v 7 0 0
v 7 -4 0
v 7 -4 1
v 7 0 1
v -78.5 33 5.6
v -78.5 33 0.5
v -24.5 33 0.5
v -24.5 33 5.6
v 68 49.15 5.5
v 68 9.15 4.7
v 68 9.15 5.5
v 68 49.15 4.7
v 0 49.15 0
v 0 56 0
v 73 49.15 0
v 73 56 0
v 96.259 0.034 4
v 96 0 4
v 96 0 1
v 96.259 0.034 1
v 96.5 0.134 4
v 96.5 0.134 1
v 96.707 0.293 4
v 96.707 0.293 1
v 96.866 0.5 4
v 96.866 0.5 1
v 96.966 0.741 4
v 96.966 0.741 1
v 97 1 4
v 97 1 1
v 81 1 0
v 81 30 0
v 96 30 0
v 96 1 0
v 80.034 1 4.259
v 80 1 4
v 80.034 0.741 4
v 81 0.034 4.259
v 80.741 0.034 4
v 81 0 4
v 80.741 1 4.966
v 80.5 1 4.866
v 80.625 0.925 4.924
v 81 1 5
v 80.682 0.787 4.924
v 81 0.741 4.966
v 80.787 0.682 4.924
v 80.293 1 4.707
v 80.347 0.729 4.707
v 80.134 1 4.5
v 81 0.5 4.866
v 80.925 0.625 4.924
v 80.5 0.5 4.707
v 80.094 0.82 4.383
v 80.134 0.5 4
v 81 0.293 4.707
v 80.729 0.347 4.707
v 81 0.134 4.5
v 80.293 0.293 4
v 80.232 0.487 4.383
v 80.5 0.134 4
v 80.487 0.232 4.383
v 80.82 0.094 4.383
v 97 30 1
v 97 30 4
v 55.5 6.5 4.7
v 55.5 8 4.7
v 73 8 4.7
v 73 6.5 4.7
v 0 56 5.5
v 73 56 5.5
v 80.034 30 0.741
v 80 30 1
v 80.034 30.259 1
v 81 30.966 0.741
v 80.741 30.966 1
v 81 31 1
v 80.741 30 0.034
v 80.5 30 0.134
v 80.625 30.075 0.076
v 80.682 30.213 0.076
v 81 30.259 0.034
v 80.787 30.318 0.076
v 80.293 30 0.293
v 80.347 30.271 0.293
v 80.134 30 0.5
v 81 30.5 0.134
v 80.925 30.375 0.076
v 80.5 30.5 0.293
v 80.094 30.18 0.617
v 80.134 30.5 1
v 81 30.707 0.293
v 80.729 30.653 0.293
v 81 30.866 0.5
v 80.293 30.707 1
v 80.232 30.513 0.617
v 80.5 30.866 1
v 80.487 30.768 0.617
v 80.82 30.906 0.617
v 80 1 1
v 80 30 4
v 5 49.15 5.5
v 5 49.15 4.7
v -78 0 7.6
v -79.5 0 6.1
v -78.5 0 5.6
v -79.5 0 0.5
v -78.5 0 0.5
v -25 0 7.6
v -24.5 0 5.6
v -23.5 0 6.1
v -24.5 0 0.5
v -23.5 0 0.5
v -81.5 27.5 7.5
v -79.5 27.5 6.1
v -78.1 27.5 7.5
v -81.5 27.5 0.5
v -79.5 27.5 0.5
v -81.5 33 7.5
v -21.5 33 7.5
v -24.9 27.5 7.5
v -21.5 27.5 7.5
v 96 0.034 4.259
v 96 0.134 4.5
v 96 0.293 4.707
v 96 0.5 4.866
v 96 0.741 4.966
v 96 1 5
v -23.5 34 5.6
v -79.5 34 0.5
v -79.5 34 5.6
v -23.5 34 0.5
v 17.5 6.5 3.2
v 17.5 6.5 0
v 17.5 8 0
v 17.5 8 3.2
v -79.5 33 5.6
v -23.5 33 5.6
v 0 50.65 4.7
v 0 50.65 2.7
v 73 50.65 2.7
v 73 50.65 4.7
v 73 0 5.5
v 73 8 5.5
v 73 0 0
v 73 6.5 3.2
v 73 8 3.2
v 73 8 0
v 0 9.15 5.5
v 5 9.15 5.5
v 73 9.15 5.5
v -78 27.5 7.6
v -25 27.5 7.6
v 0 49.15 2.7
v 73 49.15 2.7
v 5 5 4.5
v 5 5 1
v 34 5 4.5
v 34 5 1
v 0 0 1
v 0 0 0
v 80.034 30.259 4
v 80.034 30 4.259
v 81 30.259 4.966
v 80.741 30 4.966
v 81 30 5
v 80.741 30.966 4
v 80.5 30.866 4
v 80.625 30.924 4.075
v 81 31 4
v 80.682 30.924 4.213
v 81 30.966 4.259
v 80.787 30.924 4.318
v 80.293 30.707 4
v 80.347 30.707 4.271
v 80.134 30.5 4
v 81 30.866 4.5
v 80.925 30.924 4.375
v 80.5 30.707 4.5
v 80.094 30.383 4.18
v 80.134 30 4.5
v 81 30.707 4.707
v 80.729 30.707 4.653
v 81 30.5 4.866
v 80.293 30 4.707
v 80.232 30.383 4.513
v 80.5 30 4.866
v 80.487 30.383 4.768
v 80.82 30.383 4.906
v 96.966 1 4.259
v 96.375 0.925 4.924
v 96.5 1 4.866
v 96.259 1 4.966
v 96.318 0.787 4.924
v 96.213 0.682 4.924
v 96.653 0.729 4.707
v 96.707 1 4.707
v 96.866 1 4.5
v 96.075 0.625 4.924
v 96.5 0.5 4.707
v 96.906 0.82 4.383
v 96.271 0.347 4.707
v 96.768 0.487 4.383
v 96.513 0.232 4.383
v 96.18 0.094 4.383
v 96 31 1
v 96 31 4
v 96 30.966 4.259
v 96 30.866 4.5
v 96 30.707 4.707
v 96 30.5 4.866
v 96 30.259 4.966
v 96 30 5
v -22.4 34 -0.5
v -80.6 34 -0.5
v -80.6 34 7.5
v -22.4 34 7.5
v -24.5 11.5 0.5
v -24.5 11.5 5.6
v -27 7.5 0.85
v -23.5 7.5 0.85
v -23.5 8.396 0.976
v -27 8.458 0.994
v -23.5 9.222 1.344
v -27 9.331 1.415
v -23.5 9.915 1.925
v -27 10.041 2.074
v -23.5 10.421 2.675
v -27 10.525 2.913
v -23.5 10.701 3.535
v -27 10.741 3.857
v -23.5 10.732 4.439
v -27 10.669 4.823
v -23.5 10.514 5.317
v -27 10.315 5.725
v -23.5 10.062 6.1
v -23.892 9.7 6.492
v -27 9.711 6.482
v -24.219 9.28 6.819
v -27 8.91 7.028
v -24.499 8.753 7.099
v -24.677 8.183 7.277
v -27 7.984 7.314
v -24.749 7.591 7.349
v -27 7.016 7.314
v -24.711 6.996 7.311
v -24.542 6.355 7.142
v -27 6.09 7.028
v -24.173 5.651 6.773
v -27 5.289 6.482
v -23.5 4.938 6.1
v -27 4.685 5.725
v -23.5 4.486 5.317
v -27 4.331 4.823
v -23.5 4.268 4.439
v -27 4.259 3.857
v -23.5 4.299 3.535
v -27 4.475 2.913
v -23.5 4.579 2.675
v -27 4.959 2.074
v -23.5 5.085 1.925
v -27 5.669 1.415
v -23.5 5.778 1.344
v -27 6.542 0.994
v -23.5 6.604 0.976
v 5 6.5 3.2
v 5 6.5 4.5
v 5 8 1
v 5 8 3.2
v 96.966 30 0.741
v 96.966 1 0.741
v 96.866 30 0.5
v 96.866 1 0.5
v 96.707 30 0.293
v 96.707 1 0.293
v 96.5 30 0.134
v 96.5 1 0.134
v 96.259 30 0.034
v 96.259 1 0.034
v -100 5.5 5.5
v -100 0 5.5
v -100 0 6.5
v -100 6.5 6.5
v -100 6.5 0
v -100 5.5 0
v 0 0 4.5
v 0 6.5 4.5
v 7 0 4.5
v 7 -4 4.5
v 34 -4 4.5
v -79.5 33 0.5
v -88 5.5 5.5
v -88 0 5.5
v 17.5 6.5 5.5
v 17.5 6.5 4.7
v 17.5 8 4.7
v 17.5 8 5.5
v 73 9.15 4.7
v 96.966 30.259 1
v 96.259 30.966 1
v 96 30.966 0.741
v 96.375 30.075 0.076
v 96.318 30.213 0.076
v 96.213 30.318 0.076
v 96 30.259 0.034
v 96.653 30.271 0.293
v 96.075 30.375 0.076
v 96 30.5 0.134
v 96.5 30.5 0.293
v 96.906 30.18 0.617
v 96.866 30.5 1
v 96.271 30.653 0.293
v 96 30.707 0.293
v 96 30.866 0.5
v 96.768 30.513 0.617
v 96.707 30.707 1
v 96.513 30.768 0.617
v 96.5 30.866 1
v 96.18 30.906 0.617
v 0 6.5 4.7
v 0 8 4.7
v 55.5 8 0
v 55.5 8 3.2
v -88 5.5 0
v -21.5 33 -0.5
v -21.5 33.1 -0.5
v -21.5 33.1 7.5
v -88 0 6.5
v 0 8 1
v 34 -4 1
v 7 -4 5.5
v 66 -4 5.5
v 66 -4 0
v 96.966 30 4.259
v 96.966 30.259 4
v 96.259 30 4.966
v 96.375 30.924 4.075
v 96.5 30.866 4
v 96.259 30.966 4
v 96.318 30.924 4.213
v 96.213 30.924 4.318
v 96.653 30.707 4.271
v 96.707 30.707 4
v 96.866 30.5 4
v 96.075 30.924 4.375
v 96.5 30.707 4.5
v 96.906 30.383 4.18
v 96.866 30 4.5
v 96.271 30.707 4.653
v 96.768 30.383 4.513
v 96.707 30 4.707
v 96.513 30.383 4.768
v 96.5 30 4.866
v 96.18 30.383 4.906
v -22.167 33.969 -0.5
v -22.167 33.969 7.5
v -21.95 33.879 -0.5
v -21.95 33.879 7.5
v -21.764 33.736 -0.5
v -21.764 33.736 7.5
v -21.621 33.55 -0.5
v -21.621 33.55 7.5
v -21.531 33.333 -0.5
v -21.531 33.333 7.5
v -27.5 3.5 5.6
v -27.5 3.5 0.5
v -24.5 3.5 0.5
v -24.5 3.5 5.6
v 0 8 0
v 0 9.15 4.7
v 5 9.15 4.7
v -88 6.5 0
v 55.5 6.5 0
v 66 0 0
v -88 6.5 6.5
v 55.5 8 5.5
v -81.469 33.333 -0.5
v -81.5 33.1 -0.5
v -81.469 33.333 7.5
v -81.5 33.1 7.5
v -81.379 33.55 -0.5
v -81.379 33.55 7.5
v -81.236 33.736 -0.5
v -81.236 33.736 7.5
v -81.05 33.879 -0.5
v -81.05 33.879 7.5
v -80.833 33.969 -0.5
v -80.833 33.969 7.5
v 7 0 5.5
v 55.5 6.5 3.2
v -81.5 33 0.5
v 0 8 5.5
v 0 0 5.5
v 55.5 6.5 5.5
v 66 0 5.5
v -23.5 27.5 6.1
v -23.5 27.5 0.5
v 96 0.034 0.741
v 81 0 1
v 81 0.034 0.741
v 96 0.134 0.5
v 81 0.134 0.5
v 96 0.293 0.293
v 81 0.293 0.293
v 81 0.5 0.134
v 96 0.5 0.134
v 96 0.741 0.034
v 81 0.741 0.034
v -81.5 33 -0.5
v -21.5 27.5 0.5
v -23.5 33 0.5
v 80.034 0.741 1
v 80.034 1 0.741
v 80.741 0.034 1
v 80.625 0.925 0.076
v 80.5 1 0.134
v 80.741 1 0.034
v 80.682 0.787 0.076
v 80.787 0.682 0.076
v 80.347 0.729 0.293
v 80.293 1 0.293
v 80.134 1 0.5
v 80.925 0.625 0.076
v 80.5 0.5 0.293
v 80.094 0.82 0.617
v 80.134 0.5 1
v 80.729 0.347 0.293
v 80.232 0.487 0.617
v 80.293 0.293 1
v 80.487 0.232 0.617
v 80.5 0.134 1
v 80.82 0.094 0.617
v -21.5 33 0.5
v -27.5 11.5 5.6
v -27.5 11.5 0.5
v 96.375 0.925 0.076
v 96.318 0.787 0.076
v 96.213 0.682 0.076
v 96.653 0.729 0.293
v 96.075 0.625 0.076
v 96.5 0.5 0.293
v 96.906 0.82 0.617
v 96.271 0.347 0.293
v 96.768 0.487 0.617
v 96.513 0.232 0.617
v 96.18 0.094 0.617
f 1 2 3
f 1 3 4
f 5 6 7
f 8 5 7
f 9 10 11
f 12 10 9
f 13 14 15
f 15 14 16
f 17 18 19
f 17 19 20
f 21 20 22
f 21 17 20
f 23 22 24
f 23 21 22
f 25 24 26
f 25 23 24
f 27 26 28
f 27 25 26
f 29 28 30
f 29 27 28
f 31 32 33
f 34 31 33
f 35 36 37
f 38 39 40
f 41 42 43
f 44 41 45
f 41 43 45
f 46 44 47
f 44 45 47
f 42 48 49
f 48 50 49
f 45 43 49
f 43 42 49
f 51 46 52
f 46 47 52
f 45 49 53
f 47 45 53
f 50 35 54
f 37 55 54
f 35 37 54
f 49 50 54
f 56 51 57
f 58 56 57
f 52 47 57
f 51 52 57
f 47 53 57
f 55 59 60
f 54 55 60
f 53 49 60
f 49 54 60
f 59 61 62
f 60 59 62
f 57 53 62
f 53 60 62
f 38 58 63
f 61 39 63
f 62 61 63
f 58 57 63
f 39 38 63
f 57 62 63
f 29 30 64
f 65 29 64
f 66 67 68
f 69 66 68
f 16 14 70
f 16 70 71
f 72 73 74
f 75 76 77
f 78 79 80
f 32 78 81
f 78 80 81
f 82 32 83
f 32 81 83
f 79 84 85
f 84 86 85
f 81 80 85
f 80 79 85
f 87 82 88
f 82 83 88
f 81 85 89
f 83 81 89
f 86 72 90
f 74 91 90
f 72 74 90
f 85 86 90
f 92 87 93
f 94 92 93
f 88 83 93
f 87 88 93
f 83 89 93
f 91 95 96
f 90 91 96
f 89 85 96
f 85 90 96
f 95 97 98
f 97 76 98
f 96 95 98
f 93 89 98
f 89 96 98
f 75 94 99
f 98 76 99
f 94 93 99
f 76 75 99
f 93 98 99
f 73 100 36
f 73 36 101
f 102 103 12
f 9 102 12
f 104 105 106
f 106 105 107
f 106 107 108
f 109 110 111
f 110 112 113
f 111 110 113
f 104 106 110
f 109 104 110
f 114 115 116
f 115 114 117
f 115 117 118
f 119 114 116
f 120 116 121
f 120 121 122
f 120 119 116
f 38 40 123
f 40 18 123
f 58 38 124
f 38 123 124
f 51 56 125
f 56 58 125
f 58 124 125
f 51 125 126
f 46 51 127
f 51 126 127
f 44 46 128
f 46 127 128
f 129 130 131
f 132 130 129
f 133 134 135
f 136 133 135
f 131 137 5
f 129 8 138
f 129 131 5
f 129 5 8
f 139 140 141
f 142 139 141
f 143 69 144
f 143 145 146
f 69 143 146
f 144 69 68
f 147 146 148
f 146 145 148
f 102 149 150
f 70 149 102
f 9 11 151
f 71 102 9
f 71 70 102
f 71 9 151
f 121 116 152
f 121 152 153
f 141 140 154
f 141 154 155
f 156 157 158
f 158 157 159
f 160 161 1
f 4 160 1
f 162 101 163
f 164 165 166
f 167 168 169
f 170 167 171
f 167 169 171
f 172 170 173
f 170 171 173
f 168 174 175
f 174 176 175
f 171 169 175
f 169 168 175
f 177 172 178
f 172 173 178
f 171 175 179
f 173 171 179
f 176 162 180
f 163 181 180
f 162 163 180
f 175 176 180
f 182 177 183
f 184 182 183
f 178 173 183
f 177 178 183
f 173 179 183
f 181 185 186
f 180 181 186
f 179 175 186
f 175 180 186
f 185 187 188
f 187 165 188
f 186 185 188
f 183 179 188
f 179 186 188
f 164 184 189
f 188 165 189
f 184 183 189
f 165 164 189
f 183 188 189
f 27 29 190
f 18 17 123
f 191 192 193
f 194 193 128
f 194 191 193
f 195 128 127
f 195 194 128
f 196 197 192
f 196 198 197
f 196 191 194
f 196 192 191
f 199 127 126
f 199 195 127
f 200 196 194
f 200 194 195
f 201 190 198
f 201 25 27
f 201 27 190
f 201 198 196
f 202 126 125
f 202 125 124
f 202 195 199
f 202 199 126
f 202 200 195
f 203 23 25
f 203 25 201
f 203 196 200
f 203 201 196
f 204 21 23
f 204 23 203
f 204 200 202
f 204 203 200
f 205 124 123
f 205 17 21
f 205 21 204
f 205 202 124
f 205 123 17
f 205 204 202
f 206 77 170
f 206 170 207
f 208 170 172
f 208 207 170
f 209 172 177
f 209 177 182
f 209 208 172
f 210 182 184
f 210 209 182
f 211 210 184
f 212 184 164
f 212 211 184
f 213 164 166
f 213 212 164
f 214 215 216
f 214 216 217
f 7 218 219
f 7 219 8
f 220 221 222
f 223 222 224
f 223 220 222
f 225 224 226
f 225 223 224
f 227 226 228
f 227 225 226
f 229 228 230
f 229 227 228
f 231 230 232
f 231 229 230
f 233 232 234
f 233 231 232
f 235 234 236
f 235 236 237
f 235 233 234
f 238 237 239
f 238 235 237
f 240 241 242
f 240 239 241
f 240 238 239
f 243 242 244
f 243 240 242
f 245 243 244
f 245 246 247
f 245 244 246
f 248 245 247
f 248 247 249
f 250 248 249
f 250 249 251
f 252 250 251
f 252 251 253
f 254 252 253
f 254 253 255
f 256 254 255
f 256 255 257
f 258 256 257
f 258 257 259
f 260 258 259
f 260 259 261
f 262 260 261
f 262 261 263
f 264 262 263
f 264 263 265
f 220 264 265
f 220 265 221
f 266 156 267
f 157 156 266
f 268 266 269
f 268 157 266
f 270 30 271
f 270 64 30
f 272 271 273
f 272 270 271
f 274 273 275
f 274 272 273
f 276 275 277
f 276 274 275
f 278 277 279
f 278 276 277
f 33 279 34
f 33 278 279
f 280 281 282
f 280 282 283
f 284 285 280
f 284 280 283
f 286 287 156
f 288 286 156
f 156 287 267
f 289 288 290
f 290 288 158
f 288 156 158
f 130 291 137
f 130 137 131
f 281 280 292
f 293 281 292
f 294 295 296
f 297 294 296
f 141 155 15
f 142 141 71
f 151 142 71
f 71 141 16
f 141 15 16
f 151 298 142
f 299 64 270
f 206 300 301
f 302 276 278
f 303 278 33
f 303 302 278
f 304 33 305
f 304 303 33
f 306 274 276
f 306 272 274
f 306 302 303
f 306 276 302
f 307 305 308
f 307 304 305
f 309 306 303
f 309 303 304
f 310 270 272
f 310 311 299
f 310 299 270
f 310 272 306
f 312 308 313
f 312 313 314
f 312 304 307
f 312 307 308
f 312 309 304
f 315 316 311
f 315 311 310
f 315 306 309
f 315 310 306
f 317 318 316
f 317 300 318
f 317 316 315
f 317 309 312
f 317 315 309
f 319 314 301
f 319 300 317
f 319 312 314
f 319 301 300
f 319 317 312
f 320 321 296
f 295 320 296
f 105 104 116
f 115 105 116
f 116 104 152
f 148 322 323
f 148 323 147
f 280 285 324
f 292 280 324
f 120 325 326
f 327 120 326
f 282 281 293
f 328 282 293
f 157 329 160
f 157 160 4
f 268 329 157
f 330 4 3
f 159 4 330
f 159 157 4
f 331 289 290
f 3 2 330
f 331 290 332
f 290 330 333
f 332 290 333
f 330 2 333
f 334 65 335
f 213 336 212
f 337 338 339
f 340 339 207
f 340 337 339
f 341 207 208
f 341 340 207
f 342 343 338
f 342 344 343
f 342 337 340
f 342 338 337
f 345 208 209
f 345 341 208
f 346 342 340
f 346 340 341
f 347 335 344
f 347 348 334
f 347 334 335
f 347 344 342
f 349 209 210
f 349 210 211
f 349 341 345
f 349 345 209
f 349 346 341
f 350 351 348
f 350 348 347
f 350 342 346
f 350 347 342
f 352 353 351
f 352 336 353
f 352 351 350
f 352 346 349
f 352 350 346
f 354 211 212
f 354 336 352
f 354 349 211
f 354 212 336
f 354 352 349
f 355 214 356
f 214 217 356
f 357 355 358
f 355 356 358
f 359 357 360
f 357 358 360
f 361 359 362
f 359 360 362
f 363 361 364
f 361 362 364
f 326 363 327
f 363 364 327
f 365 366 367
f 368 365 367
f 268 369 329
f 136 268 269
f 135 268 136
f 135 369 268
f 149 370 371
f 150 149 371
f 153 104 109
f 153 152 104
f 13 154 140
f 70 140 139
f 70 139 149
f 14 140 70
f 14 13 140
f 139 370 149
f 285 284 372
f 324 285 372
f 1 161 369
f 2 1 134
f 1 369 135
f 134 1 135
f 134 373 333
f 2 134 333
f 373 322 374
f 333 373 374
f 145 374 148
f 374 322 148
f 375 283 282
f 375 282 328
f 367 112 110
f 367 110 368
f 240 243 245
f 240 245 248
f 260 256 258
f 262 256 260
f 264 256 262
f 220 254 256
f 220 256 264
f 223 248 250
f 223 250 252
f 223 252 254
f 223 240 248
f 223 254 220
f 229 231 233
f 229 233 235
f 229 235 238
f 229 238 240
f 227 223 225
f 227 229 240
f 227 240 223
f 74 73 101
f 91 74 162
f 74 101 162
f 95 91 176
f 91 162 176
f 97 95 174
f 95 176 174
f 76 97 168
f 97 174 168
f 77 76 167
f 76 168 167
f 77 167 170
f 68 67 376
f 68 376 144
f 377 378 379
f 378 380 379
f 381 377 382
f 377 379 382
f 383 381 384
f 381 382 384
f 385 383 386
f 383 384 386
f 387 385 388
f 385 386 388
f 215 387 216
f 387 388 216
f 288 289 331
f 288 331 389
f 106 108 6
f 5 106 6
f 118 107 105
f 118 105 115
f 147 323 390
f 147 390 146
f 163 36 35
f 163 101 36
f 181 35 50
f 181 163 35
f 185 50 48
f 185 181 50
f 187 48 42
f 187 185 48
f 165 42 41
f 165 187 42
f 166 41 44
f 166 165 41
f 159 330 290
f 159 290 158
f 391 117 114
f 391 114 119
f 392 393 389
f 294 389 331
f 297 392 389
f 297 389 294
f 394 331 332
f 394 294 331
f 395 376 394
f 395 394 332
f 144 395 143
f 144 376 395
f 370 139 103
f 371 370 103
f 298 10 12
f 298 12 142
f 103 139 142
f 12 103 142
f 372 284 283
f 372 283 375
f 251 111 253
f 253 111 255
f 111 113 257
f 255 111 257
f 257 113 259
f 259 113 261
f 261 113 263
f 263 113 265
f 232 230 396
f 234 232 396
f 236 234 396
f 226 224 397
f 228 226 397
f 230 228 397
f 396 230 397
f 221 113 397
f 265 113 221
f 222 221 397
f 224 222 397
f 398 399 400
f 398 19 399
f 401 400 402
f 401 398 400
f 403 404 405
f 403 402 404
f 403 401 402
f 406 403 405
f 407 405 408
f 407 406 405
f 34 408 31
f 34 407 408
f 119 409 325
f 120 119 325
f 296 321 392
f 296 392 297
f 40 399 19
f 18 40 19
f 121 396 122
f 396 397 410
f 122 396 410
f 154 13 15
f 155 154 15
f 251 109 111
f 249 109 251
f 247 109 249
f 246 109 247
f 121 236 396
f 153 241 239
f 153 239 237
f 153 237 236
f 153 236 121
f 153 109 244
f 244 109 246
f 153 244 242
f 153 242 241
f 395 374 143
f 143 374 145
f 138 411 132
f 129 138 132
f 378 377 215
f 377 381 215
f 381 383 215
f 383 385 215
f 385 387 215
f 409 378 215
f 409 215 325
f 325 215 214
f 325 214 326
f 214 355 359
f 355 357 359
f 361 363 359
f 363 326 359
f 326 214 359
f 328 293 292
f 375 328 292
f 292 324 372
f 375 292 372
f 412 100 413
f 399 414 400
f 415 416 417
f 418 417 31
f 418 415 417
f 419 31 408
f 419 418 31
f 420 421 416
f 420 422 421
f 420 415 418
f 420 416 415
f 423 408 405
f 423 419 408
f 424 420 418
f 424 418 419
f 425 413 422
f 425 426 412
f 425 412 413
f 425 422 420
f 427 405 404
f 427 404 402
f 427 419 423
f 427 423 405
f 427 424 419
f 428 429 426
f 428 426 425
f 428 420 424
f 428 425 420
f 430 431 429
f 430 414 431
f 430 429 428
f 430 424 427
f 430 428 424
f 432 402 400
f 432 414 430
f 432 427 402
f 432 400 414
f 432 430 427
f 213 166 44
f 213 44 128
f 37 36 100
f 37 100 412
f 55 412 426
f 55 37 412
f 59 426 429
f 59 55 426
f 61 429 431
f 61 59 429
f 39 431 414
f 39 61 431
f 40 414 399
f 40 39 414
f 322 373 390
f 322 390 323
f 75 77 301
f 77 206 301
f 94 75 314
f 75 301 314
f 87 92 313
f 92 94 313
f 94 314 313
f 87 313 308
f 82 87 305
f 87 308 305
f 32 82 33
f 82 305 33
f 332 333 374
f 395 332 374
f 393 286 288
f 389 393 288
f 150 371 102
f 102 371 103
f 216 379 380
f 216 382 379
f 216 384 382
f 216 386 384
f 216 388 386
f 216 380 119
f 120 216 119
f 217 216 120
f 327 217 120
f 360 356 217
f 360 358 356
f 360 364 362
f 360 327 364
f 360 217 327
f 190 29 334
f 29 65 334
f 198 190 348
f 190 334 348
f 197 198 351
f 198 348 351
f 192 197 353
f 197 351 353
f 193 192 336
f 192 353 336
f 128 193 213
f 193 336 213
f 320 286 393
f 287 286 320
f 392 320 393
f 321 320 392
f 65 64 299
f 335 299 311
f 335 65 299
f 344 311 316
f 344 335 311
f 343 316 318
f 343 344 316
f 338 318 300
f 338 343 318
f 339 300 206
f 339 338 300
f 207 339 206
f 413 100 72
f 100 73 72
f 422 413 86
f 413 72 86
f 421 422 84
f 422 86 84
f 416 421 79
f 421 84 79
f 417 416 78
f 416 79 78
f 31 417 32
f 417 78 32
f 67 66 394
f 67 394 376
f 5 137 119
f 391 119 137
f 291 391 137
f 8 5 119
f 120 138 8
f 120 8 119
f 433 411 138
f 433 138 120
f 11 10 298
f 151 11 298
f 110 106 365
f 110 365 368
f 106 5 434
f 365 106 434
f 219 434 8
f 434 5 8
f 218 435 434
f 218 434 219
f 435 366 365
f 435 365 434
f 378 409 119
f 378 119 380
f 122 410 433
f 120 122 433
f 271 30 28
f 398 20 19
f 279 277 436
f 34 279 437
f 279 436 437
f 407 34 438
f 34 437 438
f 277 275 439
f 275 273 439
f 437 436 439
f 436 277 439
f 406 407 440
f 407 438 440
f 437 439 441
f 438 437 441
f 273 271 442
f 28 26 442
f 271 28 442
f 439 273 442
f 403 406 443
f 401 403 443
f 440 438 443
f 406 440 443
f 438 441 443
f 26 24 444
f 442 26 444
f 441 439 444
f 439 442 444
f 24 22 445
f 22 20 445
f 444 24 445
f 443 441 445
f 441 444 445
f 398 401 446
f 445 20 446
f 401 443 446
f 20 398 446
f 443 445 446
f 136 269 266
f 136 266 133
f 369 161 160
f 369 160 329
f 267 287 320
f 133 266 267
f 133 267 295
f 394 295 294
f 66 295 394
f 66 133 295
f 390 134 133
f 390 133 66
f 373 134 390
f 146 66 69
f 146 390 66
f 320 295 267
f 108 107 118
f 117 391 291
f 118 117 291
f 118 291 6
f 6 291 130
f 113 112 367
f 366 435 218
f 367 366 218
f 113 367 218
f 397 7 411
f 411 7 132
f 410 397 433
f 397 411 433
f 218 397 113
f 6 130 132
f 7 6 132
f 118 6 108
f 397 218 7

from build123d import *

# Parameters (mm, degrees)
BOX012_W          = 5
BOX012_H          = 41.5
BOX012_DEPTH      = 0.8
BOX013_W          = 5
BOX013_H          = 41.5
BOX013_DEPTH      = 0.8
BOX008_W          = 73
BOX008_H          = 1.5
BOX008_DEPTH      = 2
BOX007_W          = 73
BOX007_H          = 1.5
BOX007_DEPTH      = 5.5
BOX005_W          = 73
BOX005_H          = 5.35
BOX005_DEPTH      = 5.5
BOX015_W          = 34
BOX015_H          = 5
BOX015_DEPTH      = 3.5
BOX016_W          = 27
BOX016_H          = 4
BOX016_DEPTH      = 3.5
BOX014_W          = 5
BOX014_H          = 8
BOX014_DEPTH      = 3.5
BOX010_W          = 73
BOX010_H          = 1.5
BOX010_DEPTH      = 1.5
BOX011_W          = 38
BOX011_H          = 1.5
BOX011_DEPTH      = 5.5
BOX001_W          = 73
BOX001_H          = 6.5
BOX001_DEPTH      = 5.5
BOX009_W          = 73
BOX009_H          = 1.5
BOX009_DEPTH      = 5.5
BOX002_W          = 59
BOX002_H          = 4
BOX002_DEPTH      = 5.5
BOX044_W          = 17
BOX044_H          = 31
BOX044_DEPTH      = 5
FILLET007_R       = 1
BOX046_W          = 12
BOX046_H          = 5.5
BOX046_DEPTH      = 5.5
BOX045_W          = 12
BOX045_H          = 6.5
BOX045_DEPTH      = 6.5
CYLINDER005_R     = 3.25
CYLINDER005_DEPTH = 3.5
BOX043_W          = 3
BOX043_H          = 8
BOX043_DEPTH      = 5.5
BOX017_W          = 54
BOX017_H          = 33
BOX017_DEPTH      = 5.1
BOX026_W          = 60
BOX026_H          = 5.5
BOX026_DEPTH      = 7
BOX_W             = 56
BOX_H             = 34
BOX_DEPTH         = 5.1
BOX025_W          = 56
BOX025_H          = 27.5
BOX025_DEPTH      = 2
CHAMFER_SIZE      = 1.5
BOX047_W          = 60
BOX047_H          = 1
BOX047_DEPTH      = 8
FILLET_R          = 0.9
FILLET008_R       = 0.9


with BuildPart() as cube_front_cover_left:
    # Box012 → Box012 (new body)
    with BuildSketch(Plane(origin=(0, 9.15, 4.7), x_dir=(1, 0, 0), z_dir=(0, 0, 1))):
        with Locations((2.5, 20.75)):
            Rectangle(BOX012_W, BOX012_H)
    extrude(amount=BOX012_DEPTH)


with BuildPart() as cube_front_cover_right:
    # Box013 → Box013 (new body)
    with BuildSketch(Plane(origin=(68, 9.15, 4.7), x_dir=(1, 0, 0), z_dir=(0, 0, 1))):
        with Locations((2.5, 20.75)):
            Rectangle(BOX013_W, BOX013_H)
    extrude(amount=BOX013_DEPTH)


with BuildPart() as cube_screen_surround_top_groove_inner:
    # Box008 → Box008 (new body)
    with BuildSketch(Plane(origin=(0, 49.15, 2.7), x_dir=(1, 0, 0), z_dir=(0, 0, 1))):
        with Locations((36.5, 0.75)):
            Rectangle(BOX008_W, BOX008_H)
    extrude(amount=BOX008_DEPTH)


with BuildPart() as cube_screen_surround_top_groove_outer:
    # Box007 → Box007 (new body)
    with BuildSketch(Plane(origin=(0, 49.15, 0), x_dir=(1, 0, 0), z_dir=(0, 0, 1))):
        with Locations((36.5, 0.75)):
            Rectangle(BOX007_W, BOX007_H)
    extrude(amount=BOX007_DEPTH)


with BuildPart() as fusion002:
    # Box005 → Box005 (new body)
    with BuildSketch(Plane(origin=(0, 50.65, 0), x_dir=(1, 0, 0), z_dir=(0, 0, 1))):
        with Locations((36.5, 2.675)):
            Rectangle(BOX005_W, BOX005_H)
    extrude(amount=BOX005_DEPTH)

    # Fusion001: union Cube(screen_surround_top_groove_outer)
    add(cube_screen_surround_top_groove_outer.part)

    # Cut002: cut Cube(screen_surround_top_groove_inner)
    add(cube_screen_surround_top_groove_inner.part, mode=Mode.SUBTRACT)

    # Fusion002: union Cube(front_cover_left), Cube(front_cover_right)
    add(cube_front_cover_left.part)
    add(cube_front_cover_right.part)


with BuildPart() as cube001_wire_cutter_left_bottom:
    # Box015 → Box015 (new body)
    with BuildSketch(Plane.XY.offset(1)):
        with Locations((17, 2.5)):
            Rectangle(BOX015_W, BOX015_H)
    extrude(amount=BOX015_DEPTH)


with BuildPart() as cube002_wire_cutter_bottom:
    # Box016 → Box016 (new body)
    with BuildSketch(Plane(origin=(7, -4, 1), x_dir=(1, 0, 0), z_dir=(0, 0, 1))):
        with Locations((13.5, 2)):
            Rectangle(BOX016_W, BOX016_H)
    extrude(amount=BOX016_DEPTH)


with BuildPart() as cube_wire_cutter_left:
    # Box014 → Box014 (new body)
    with BuildSketch(Plane.XY.offset(1)):
        with Locations((2.5, 4)):
            Rectangle(BOX014_W, BOX014_H)
    extrude(amount=BOX014_DEPTH)


with BuildPart() as cube_screen_surround_bottom_groove_inner:
    # Box010 → Box010 (new body)
    with BuildSketch(Plane(origin=(0, 6.5, 3.2), x_dir=(1, 0, 0), z_dir=(0, 0, 1))):
        with Locations((36.5, 0.75)):
            Rectangle(BOX010_W, BOX010_H)
    extrude(amount=BOX010_DEPTH)


with BuildPart() as box011:
    # Box011 → Box011 (new body)
    with BuildSketch(Plane(origin=(17.5, 6.5, 0), x_dir=(1, 0, 0), z_dir=(0, 0, 1))):
        with Locations((19, 0.75)):
            Rectangle(BOX011_W, BOX011_H)
    extrude(amount=BOX011_DEPTH)


with BuildPart() as cube_screen_surround_buttom:
    # Box001 → Box001 (new body)
    with BuildSketch(Plane.XY):
        with Locations((36.5, 3.25)):
            Rectangle(BOX001_W, BOX001_H)
    extrude(amount=BOX001_DEPTH)


with BuildPart() as cube_screen_surround_bottom_groove_outer:
    # Box009 → Box009 (new body)
    with BuildSketch(Plane(origin=(0, 6.5, 0), x_dir=(1, 0, 0), z_dir=(0, 0, 1))):
        with Locations((36.5, 0.75)):
            Rectangle(BOX009_W, BOX009_H)
    extrude(amount=BOX009_DEPTH)


with BuildPart() as cut006:
    # Box002 → Box002 (new body)
    with BuildSketch(Plane(origin=(7, -4, 0), x_dir=(1, 0, 0), z_dir=(0, 0, 1))):
        with Locations((29.5, 2)):
            Rectangle(BOX002_W, BOX002_H)
    extrude(amount=BOX002_DEPTH)

    # Fusion: union Cube(screen_surround_buttom), Cube(screen_surround_bottom_groove_outer)
    add(cube_screen_surround_buttom.part)
    add(cube_screen_surround_bottom_groove_outer.part)

    # Cut: cut Box011
    add(box011.part, mode=Mode.SUBTRACT)

    # Cut003: cut Cube(screen_surround_bottom_groove_inner)
    add(cube_screen_surround_bottom_groove_inner.part, mode=Mode.SUBTRACT)

    # Cut004: cut Cube(wire_cutter_left)
    add(cube_wire_cutter_left.part, mode=Mode.SUBTRACT)

    # Cut005: cut Cube002(wire_cutter_bottom)
    add(cube002_wire_cutter_bottom.part, mode=Mode.SUBTRACT)

    # Cut006: cut Cube001(wire_cutter_left_bottom)
    add(cube001_wire_cutter_left_bottom.part, mode=Mode.SUBTRACT)


with BuildPart() as fillet007_battery_shim:
    # Box044 → Box044 (new body)
    with BuildSketch(Plane(origin=(80, 0, 0), x_dir=(1, 0, 0), z_dir=(0, 0, 1))):
        with Locations((8.5, 15.5)):
            Rectangle(BOX044_W, BOX044_H)
    extrude(amount=BOX044_DEPTH)

    # Fillet007
    fillet007_edges = [fillet007_battery_shim.edges().sort_by_distance(p)[0] for p in [
        (80, 0, 2.5),
        (80, 15.5, 5),
        (80, 31, 2.5),
        (80, 15.5, 0),
        (97, 0, 2.5),
        (97, 15.5, 5),
        (97, 31, 2.5),
        (97, 15.5, 0),
        (88.5, 0, 0),
        (88.5, 0, 5),
        (88.5, 31, 0),
        (88.5, 31, 5),
    ]]
    fillet(fillet007_edges, radius=FILLET007_R)


with BuildPart() as cube011_port_cover_inner:
    # Box046 → Box046 (new body)
    with BuildSketch(Plane(origin=(-100, 0, 0), x_dir=(1, 0, 0), z_dir=(0, 0, 1))):
        with Locations((6, 2.75)):
            Rectangle(BOX046_W, BOX046_H)
    extrude(amount=BOX046_DEPTH)


with BuildPart() as cut032_port_cover:
    # Box045 → Box045 (new body)
    with BuildSketch(Plane(origin=(-100, 0, 0), x_dir=(1, 0, 0), z_dir=(0, 0, 1))):
        with Locations((6, 3.25)):
            Rectangle(BOX045_W, BOX045_H)
    extrude(amount=BOX045_DEPTH)

    # Cut032: cut Cube011(port_cover_inner)
    add(cube011_port_cover_inner.part, mode=Mode.SUBTRACT)


with BuildPart() as cylinder003_magnet:
    # Cylinder005 → Cylinder005 (new body)
    with BuildSketch(Plane(origin=(-27, 7.5, 4.1), x_dir=(0, 0, -1), z_dir=(1, 0, 0))):
        Circle(CYLINDER005_R)
    extrude(amount=CYLINDER005_DEPTH)


with BuildPart() as cube010_magnet_back:
    # Box043 → Box043 (new body)
    with BuildSketch(Plane(origin=(-27.5, 3.5, 0.5), x_dir=(1, 0, 0), z_dir=(0, 0, 1))):
        with Locations((1.5, 4)):
            Rectangle(BOX043_W, BOX043_H)
    extrude(amount=BOX043_DEPTH)


with BuildPart() as cube_inner:
    # Box017 → Box017 (new body)
    with BuildSketch(Plane(origin=(-78.5, 0, 0.5), x_dir=(1, 0, 0), z_dir=(0, 0, 1))):
        with Locations((27, 16.5)):
            Rectangle(BOX017_W, BOX017_H)
    extrude(amount=BOX017_DEPTH)


with BuildPart() as cube002_lid_top:
    # Box026 → Box026 (new body)
    with BuildSketch(Plane(origin=(-81.5, 27.5, 0.5), x_dir=(1, 0, 0), z_dir=(0, 0, 1))):
        with Locations((30, 2.75)):
            Rectangle(BOX026_W, BOX026_H)
    extrude(amount=BOX026_DEPTH)


with BuildPart() as cube_outer:
    # Box → Box (new body)
    with BuildSketch(Plane(origin=(-79.5, 0, 0.5), x_dir=(1, 0, 0), z_dir=(0, 0, 1))):
        with Locations((28, 17)):
            Rectangle(BOX_W, BOX_H)
    extrude(amount=BOX_DEPTH)


with BuildPart() as cut034:
    # Box025 → Box025 (new body)
    with BuildSketch(Plane(origin=(-79.5, 0, 5.6), x_dir=(1, 0, 0), z_dir=(0, 0, 1))):
        with Locations((28, 13.75)):
            Rectangle(BOX025_W, BOX025_H)
    extrude(amount=BOX025_DEPTH)

    # Chamfer
    chamfer_edges = [cut034.edges().sort_by_distance(p)[0] for p in [
        (-79.5, 13.75, 7.6),
        (-23.5, 13.75, 7.6),
    ]]
    chamfer(chamfer_edges, length=CHAMFER_SIZE)

    # Fusion003: union Cube002(lid_top), Cube(outer)
    add(cube002_lid_top.part)
    add(cube_outer.part)

    # Cut033: cut Cube(inner)
    add(cube_inner.part, mode=Mode.SUBTRACT)

    # Fusion004: union Cube010(magnet_back)
    add(cube010_magnet_back.part)

    # Cut034: cut Cylinder003(magnet)
    add(cylinder003_magnet.part, mode=Mode.SUBTRACT)


with BuildPart() as fillet008:
    # Box047 → Box047 (new body)
    with BuildSketch(Plane(origin=(-81.5, 33, -0.5), x_dir=(1, 0, 0), z_dir=(0, 0, 1))):
        with Locations((30, 0.5)):
            Rectangle(BOX047_W, BOX047_H)
    extrude(amount=BOX047_DEPTH)

    # Fillet
    fillet_edges = [fillet008.edges().sort_by_distance(p)[0] for p in [
        (-81.5, 34, 3.5),
    ]]
    fillet(fillet_edges, radius=FILLET_R)

    # Fillet008
    fillet008_edges = [fillet008.edges().sort_by_distance(p)[0] for p in [
        (-21.5, 34, 3.5),
    ]]
    fillet(fillet008_edges, radius=FILLET008_R)


solid = Compound([fusion002.part, cut006.part, fillet007_battery_shim.part, cut032_port_cover.part, cut034.part, fillet008.part])
